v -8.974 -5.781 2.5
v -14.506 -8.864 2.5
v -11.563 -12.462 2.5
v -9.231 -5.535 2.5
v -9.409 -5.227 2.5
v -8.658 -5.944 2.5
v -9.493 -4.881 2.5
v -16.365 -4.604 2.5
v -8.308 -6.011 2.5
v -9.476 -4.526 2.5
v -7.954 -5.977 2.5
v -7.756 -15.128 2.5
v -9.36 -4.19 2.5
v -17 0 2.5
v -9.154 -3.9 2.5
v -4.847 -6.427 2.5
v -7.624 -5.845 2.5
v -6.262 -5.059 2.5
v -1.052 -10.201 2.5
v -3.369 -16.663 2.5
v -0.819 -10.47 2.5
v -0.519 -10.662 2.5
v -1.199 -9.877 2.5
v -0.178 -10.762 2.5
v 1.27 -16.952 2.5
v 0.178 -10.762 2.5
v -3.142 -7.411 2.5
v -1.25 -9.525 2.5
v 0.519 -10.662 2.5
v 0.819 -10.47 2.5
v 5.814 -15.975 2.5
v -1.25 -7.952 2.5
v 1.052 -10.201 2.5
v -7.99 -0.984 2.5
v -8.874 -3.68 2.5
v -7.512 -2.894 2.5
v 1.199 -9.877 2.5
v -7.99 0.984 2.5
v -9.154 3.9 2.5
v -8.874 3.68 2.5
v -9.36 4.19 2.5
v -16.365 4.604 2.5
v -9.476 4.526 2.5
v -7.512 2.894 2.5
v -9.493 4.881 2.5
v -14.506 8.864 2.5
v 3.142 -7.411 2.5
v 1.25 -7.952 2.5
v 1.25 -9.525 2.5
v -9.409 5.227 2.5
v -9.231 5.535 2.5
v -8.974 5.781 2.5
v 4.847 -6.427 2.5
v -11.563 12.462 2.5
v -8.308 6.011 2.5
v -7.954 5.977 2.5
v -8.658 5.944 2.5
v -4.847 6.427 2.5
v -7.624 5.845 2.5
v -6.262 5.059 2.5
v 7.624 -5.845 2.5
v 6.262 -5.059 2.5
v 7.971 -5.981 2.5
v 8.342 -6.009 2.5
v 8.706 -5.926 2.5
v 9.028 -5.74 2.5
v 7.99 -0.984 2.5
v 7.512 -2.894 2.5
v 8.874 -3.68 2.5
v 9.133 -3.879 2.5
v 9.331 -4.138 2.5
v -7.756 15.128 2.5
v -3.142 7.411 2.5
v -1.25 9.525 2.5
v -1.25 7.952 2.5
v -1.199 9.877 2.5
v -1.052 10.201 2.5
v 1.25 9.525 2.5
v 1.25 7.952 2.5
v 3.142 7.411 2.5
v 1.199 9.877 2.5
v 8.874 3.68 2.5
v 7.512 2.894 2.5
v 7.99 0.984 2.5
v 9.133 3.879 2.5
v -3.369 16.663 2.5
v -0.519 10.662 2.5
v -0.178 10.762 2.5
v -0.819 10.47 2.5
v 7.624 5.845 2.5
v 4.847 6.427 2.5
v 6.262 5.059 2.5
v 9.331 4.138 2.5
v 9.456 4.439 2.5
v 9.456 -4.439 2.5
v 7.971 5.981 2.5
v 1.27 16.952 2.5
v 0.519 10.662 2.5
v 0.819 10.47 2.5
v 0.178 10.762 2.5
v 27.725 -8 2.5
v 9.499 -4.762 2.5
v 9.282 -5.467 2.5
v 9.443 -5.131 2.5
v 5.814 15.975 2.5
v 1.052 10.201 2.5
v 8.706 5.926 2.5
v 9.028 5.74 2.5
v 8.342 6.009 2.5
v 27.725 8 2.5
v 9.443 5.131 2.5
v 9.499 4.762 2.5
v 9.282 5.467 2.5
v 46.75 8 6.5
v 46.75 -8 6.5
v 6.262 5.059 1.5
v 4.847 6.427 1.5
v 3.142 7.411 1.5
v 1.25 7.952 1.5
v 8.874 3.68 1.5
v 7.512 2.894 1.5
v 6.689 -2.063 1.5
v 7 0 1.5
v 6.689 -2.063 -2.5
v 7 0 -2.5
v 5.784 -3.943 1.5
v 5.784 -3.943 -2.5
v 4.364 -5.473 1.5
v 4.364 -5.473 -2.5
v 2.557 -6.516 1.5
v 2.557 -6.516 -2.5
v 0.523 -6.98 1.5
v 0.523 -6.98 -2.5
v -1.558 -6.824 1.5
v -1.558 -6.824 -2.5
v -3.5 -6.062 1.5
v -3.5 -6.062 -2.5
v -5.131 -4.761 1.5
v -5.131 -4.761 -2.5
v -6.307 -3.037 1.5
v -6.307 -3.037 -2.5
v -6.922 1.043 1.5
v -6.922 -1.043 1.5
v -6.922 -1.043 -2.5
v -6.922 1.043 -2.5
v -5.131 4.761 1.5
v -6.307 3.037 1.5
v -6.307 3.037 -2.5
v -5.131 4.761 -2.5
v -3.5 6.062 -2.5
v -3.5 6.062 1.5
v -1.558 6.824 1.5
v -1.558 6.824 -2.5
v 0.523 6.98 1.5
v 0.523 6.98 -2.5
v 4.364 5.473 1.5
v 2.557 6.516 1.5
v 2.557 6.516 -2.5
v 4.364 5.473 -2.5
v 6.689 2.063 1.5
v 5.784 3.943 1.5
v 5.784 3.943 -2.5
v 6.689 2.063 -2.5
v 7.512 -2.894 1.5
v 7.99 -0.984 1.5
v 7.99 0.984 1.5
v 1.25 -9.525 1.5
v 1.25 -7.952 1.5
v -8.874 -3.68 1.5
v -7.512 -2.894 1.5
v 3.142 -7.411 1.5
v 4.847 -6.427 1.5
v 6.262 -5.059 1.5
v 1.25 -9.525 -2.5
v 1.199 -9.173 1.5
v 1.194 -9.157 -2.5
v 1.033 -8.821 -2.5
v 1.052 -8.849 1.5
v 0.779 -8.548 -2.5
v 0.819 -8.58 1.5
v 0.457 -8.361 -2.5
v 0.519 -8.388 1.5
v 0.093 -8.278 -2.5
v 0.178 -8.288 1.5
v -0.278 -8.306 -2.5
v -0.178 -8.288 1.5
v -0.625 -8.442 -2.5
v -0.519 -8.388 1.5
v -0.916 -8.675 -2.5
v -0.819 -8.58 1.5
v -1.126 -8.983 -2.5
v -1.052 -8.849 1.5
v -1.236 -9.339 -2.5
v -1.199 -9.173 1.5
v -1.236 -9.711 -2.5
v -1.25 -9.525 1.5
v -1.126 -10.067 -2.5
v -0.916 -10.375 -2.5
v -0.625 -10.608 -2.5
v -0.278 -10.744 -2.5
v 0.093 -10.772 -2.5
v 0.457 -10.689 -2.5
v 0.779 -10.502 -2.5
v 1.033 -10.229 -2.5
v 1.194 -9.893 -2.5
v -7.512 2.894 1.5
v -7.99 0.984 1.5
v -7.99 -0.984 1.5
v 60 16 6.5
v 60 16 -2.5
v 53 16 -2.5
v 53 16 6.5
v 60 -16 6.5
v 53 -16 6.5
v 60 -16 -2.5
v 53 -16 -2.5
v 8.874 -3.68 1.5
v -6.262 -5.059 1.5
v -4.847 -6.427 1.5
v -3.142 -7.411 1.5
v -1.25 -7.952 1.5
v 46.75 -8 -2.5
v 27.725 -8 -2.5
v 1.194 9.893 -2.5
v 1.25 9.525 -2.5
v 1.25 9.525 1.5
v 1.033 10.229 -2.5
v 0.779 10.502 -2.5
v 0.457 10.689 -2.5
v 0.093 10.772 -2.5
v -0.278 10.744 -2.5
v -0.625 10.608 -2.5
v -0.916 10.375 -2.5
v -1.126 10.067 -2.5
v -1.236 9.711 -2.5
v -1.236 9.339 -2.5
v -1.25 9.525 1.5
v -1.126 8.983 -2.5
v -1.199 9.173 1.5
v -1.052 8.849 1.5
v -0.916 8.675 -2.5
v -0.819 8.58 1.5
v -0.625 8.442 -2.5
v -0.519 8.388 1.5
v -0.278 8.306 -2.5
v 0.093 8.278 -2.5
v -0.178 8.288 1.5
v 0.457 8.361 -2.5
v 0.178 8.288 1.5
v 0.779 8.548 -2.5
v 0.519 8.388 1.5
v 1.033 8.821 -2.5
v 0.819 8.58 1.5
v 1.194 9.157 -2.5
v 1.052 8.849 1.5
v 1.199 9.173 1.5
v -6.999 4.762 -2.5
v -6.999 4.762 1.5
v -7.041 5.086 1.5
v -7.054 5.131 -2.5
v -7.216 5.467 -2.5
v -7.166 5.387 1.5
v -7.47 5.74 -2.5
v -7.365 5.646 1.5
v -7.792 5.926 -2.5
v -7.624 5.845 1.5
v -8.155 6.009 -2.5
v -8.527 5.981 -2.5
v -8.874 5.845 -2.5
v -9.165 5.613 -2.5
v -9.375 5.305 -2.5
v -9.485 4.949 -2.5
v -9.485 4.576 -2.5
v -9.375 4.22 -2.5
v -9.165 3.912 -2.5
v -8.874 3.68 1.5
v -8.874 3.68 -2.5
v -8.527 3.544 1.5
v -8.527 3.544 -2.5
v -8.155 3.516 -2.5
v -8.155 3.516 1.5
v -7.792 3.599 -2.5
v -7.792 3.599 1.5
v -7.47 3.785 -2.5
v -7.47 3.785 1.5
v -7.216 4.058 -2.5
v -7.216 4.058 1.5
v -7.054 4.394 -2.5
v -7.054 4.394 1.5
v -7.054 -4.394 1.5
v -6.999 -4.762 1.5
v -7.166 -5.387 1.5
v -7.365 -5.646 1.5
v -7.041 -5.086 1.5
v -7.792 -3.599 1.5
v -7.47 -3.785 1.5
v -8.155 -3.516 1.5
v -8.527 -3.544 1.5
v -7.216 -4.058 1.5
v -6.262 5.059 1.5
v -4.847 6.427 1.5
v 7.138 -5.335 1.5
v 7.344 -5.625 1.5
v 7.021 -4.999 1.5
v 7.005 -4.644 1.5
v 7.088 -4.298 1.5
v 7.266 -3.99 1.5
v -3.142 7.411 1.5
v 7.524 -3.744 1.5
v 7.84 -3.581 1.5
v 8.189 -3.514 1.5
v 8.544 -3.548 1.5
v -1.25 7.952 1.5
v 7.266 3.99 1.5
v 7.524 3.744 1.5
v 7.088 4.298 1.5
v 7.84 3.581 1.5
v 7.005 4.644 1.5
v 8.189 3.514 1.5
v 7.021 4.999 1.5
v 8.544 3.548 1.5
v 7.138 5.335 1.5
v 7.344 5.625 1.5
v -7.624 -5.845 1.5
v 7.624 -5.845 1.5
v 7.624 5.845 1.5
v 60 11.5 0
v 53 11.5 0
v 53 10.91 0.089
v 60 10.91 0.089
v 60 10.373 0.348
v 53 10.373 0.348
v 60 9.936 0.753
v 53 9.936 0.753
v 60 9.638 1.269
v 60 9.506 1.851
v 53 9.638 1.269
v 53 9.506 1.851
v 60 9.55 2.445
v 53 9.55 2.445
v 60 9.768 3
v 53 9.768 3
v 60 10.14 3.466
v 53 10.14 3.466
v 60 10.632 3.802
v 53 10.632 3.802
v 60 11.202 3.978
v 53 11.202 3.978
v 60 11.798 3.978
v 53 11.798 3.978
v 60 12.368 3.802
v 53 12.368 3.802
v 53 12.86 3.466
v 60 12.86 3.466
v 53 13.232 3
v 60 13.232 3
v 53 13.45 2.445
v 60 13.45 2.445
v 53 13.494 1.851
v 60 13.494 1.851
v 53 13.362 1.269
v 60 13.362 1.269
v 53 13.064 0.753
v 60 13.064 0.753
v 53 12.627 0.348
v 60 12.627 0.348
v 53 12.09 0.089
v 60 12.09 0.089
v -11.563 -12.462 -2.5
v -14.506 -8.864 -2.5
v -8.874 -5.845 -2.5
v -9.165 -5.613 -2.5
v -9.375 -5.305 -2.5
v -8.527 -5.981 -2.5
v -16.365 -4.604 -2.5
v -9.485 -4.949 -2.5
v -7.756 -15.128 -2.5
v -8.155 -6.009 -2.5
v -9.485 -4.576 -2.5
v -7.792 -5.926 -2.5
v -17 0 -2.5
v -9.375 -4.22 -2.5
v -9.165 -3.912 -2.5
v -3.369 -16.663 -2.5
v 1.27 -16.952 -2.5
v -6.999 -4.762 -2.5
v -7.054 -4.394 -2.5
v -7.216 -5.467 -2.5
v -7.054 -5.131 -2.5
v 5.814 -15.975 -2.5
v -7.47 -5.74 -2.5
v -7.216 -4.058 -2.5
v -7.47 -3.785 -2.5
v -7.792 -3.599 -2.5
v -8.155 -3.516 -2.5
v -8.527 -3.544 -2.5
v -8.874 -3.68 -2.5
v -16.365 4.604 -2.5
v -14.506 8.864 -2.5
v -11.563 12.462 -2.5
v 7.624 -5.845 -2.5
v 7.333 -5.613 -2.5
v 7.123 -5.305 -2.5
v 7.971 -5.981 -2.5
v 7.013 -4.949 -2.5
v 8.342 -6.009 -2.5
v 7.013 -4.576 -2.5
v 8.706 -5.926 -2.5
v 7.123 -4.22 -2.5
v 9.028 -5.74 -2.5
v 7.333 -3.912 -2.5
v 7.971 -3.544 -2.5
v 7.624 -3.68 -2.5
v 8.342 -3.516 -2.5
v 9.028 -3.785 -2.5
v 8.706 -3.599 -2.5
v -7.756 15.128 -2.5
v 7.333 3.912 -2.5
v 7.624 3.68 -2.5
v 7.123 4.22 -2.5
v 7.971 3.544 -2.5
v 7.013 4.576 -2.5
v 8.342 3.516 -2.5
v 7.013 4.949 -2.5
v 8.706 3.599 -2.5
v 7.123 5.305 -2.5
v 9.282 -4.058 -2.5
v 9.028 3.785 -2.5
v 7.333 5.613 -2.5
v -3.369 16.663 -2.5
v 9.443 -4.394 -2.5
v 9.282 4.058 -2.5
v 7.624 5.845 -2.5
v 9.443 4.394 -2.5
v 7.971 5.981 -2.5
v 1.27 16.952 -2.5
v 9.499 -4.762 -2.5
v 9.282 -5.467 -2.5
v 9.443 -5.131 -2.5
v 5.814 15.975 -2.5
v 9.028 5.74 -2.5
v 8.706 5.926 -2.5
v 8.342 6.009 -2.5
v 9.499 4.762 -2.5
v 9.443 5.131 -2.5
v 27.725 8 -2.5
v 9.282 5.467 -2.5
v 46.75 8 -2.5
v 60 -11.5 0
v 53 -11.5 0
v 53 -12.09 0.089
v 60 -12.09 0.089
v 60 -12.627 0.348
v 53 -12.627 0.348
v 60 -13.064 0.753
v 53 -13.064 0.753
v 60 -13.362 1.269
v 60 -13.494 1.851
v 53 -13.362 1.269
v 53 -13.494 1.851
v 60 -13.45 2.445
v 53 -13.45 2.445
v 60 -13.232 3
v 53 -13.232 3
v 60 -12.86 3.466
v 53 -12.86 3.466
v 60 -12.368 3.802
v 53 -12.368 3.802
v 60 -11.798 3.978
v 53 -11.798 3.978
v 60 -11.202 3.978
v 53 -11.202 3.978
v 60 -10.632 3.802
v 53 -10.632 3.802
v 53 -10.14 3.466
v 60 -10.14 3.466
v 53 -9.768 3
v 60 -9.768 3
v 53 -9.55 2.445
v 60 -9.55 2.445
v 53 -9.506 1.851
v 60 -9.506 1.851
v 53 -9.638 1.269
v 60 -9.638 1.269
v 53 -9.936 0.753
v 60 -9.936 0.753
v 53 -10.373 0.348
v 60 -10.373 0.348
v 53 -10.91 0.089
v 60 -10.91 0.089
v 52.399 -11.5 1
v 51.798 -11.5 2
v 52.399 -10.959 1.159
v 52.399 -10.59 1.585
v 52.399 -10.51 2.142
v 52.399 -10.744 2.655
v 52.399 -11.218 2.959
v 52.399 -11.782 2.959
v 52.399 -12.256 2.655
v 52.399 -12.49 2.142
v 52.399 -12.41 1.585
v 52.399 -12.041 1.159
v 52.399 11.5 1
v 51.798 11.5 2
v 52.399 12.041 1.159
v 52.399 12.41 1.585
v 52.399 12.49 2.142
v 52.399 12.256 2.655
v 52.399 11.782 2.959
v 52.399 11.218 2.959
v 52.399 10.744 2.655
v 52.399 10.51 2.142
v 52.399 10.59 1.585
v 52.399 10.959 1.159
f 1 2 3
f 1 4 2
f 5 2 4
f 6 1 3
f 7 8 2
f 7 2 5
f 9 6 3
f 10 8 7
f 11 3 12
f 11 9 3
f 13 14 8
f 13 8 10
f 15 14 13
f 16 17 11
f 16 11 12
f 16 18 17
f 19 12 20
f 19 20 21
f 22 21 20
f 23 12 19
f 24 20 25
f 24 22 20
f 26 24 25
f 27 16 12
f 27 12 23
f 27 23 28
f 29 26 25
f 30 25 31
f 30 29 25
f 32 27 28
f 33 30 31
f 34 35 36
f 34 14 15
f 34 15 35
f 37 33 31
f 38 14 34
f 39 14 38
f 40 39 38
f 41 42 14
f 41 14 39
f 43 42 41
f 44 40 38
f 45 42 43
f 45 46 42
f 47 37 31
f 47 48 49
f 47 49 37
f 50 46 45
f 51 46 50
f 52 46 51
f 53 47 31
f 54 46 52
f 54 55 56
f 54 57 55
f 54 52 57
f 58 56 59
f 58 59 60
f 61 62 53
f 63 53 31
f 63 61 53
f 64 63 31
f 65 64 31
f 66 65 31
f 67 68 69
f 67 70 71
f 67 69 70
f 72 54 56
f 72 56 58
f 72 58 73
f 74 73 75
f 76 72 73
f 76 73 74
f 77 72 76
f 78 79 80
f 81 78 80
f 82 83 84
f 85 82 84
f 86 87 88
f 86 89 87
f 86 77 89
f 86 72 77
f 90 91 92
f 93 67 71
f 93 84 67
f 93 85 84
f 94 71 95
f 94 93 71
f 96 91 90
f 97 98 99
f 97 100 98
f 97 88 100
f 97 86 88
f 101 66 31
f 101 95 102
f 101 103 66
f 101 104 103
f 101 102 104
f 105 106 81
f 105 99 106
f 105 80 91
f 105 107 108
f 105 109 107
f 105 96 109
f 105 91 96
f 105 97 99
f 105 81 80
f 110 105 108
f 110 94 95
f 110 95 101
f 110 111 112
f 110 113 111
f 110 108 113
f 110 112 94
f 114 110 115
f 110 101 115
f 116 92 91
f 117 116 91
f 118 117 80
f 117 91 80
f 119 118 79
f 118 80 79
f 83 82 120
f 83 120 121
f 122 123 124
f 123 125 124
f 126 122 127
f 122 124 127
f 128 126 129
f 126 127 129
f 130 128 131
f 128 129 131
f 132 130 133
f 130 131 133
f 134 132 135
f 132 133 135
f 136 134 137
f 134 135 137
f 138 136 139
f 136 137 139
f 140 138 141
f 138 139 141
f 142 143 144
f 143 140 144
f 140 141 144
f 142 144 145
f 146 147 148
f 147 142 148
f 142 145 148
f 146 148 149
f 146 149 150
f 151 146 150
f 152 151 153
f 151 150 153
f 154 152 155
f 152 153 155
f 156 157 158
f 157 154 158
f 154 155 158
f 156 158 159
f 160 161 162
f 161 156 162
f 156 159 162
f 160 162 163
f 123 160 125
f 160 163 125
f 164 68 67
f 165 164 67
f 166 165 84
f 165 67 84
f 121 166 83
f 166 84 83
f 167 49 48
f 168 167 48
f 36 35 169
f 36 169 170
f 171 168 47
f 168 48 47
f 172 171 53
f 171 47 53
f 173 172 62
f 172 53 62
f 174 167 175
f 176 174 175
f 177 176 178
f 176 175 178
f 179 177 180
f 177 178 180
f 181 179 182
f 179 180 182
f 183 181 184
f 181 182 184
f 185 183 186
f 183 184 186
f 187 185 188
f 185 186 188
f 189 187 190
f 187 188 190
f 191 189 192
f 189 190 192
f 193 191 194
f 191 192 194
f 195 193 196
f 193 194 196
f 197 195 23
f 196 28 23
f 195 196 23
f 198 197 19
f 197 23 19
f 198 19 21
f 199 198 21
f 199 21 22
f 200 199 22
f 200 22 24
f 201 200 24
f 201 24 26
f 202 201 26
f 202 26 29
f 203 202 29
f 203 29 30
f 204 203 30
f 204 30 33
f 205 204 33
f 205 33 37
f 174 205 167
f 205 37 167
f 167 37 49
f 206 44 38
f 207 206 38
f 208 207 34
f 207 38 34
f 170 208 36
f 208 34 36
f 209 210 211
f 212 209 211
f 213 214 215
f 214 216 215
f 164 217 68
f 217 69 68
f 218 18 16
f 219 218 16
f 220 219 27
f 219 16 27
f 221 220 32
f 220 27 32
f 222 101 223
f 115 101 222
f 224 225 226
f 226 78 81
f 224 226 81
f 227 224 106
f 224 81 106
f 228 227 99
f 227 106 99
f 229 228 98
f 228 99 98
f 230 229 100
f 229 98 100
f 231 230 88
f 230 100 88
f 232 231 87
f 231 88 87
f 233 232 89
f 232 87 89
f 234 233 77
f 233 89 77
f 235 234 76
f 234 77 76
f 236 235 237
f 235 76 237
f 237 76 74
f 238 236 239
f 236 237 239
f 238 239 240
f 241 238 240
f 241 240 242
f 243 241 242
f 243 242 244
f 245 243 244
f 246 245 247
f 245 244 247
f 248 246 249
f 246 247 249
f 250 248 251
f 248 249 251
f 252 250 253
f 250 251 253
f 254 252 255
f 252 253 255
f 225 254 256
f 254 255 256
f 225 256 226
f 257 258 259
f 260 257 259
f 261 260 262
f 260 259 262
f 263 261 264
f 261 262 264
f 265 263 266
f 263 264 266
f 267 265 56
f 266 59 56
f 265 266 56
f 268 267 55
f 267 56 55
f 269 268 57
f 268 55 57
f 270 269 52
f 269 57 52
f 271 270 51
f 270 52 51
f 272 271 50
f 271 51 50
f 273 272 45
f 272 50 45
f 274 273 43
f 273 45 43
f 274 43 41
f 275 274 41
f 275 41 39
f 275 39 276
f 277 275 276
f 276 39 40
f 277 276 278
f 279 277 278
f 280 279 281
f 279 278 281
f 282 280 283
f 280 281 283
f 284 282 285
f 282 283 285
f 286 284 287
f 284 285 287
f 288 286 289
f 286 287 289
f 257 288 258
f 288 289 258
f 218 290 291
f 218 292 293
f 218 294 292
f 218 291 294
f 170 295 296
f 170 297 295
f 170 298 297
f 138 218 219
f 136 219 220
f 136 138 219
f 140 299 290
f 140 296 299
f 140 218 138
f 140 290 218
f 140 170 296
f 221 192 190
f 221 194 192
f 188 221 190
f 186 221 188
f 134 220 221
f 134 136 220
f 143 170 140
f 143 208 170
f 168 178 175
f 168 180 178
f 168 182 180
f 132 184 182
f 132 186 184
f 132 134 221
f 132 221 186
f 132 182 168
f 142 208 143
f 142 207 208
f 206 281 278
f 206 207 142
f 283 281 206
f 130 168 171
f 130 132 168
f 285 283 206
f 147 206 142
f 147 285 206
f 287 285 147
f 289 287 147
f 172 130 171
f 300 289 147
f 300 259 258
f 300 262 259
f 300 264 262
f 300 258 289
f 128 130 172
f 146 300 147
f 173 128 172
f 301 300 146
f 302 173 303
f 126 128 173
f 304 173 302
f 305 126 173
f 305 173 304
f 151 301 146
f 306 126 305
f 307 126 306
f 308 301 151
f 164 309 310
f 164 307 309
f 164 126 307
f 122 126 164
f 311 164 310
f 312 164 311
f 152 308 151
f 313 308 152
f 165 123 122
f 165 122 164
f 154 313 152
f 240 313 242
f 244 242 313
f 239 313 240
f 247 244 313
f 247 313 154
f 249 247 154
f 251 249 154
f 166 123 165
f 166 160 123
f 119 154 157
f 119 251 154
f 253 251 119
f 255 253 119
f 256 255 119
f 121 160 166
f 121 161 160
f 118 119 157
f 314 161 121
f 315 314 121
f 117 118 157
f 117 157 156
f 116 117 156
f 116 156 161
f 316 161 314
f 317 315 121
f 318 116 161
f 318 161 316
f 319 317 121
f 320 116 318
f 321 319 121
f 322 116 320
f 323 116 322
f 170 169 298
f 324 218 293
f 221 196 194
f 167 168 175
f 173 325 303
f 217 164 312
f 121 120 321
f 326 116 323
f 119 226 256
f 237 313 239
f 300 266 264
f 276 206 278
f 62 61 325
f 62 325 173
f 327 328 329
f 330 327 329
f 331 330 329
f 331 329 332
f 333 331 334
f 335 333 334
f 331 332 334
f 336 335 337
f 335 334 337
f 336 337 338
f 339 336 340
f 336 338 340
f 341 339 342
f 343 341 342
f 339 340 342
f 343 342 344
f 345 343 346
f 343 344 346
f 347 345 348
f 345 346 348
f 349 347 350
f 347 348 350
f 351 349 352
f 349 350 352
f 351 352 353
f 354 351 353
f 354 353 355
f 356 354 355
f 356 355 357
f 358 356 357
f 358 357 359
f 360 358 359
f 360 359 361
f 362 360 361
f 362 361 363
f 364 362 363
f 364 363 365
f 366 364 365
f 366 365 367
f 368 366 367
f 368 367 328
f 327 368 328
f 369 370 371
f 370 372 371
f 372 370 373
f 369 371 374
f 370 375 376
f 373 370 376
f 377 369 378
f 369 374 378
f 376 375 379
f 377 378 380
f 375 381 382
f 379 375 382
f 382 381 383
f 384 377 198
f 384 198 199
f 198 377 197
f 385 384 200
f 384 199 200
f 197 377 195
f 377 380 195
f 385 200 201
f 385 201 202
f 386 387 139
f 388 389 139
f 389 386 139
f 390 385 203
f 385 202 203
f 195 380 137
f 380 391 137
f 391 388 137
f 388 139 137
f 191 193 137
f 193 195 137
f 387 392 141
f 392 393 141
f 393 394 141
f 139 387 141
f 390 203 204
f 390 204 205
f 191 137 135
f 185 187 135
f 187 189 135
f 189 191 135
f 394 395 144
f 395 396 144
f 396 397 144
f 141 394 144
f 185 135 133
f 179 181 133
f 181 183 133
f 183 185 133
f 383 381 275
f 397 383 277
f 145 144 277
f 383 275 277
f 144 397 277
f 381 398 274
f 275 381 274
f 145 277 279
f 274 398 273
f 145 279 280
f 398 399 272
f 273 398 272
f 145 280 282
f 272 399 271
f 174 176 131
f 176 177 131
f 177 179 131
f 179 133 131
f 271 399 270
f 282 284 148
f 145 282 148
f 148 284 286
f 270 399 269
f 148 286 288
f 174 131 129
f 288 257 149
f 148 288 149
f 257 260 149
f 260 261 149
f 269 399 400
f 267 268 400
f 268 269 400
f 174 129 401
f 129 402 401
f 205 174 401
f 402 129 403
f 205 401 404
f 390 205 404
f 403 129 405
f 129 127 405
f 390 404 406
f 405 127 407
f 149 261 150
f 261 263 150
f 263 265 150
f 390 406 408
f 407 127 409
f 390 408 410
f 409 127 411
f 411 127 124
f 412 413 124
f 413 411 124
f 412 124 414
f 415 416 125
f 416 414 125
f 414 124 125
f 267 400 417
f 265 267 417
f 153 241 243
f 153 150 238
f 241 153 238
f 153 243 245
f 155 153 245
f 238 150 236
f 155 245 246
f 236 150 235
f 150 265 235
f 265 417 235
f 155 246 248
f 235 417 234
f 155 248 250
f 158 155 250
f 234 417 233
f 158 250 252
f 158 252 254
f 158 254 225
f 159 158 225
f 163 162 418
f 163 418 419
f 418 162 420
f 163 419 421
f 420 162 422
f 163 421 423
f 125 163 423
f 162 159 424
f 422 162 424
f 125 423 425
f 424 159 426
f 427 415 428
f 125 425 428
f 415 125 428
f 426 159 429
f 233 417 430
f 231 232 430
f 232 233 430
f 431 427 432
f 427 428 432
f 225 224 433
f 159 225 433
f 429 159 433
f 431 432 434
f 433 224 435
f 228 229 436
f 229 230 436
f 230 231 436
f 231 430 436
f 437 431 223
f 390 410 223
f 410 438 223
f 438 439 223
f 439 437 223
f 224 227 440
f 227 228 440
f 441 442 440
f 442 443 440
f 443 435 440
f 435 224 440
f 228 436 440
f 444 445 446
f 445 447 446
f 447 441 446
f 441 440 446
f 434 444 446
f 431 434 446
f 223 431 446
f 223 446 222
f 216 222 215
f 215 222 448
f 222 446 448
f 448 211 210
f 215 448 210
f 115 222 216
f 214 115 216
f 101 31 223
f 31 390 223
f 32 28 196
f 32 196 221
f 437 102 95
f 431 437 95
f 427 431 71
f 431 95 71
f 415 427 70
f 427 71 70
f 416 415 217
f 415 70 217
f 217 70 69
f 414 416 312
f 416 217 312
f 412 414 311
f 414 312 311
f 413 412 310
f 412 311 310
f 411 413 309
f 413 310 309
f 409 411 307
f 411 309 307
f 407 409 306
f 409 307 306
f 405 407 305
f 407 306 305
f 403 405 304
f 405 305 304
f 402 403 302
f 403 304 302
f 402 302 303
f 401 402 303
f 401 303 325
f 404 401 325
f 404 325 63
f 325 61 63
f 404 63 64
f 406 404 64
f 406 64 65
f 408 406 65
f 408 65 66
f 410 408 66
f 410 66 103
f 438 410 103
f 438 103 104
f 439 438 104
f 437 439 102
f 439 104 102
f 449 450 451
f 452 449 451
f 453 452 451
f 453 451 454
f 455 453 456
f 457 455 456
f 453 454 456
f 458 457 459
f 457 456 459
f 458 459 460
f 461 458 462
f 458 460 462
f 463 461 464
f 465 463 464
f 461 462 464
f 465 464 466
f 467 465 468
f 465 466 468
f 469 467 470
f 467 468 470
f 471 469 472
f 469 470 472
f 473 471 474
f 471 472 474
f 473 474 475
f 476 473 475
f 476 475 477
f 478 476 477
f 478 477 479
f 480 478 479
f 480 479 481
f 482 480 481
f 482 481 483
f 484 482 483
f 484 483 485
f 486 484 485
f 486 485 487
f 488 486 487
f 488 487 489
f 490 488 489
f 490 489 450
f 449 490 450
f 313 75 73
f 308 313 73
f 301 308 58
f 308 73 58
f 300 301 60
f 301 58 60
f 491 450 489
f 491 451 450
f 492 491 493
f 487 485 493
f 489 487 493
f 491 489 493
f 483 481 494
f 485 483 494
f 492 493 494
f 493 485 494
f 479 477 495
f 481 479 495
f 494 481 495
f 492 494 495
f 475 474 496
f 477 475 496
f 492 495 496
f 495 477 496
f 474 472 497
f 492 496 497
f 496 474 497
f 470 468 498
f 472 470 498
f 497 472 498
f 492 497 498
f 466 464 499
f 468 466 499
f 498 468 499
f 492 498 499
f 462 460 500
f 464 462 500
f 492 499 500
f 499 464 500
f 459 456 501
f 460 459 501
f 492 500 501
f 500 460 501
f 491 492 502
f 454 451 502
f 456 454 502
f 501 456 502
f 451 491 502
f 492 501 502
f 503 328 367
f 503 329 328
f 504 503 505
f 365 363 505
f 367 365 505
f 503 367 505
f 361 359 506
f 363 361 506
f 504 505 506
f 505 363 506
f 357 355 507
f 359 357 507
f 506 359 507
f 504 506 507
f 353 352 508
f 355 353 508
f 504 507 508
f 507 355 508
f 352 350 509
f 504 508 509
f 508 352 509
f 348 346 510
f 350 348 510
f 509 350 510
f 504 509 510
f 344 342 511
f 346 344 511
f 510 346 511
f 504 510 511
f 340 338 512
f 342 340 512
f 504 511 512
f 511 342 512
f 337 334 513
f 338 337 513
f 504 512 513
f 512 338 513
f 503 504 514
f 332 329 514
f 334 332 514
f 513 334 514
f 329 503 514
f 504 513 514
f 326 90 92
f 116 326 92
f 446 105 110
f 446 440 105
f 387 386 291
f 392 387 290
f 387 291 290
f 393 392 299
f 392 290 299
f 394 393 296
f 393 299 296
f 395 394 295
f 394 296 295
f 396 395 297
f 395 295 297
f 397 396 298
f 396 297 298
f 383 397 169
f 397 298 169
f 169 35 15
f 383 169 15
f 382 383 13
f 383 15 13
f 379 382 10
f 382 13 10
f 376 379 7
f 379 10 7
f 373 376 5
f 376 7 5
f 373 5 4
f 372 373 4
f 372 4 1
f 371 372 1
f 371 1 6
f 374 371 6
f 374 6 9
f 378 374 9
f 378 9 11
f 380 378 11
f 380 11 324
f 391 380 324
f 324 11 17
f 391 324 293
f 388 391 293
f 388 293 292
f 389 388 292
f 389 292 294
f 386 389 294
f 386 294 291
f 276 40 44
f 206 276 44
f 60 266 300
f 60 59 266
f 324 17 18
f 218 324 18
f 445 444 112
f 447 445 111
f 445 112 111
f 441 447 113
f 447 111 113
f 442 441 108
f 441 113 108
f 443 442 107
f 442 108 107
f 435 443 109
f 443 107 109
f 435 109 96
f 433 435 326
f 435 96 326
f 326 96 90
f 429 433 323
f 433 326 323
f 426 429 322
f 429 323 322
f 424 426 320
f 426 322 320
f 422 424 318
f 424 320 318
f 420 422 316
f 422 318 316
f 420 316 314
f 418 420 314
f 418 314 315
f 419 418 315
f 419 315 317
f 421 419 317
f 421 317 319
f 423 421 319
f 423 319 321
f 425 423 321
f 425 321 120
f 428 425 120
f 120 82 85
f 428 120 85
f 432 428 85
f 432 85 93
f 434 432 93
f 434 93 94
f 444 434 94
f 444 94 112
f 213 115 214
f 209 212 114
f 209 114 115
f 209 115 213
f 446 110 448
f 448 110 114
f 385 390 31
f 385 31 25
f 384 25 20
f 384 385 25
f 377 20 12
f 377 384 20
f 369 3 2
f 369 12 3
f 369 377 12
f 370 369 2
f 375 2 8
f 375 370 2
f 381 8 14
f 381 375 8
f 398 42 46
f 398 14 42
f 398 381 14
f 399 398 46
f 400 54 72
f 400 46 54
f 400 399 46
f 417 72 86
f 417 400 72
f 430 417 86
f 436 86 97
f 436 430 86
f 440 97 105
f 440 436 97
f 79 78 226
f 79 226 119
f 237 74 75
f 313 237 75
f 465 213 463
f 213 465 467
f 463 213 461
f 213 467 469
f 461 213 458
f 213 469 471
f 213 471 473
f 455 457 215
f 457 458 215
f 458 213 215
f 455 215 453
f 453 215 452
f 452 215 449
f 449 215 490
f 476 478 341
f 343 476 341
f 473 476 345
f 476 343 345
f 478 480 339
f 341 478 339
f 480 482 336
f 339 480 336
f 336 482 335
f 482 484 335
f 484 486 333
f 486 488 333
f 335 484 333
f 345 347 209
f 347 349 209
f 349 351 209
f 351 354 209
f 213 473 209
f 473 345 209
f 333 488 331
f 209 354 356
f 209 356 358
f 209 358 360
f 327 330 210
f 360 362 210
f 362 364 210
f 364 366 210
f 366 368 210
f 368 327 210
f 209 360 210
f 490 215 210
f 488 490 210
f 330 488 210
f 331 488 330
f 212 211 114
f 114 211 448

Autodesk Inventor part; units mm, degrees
ref_plane "YZ Plane" through (0, 0, 0) normal (1, 0, 0) x (0, 1, 0)
ref_plane "XZ Plane" through (0, 0, 0) normal (0, 1, 0) x (-1, 0, 0)
ref_plane "XY Plane" through (0, 0, 0) normal (0, 0, 1) x (1, 0, 0)
sketch "Base" plane through (0, 0, 0) normal (0, 0, 1) x (1, 0, 0)
  circle A0 centre (0, 0) radius 7
  circle A1 centre (0, 0) radius 17
  line L0 (-32.4, 0) -> (75.4, 0) construction
  line L1 (5.8143, 15.9748) -> (27.7249, 8)
  line L2 (27.7249, 8) -> (46.7497, 8)
  line L3 (46.7497, 8) -> (53, 16)
  line L4 (53, 16) -> (60, 16)
  line L5 (60, 16) -> (60, 0)
  line L6 (5.8143, -15.9748) -> (27.7249, -8)
  line L7 (27.7249, -8) -> (46.7497, -8)
  line L8 (46.7497, -8) -> (53, -16)
  line L9 (53, -16) -> (60, -16)
  line L10 (60, -16) -> (60, 0)
  point P0 (5.8143, -15.9748)
  dimension "d1" = 34
  dimension "d0" = 14
  dimension "d2" = 16
  dimension "d3" = 128
  dimension "d4" = 7
  dimension "d6" = 160
  dimension "d7" = 60
  dimension "d8" = 16
extrude "BaseFeature" add sketch "Base" along normal mid plane 5
sketch "Mount" plane through (0, 0, 2.5) normal (0, 0, 1) x (1, 0, 0)
  line L0 (60, 16) -> (53, 16) projected
  line L1 (60, -16) -> (60, 16) projected
  line L2 (53, -16) -> (60, -16) projected
  line L3 (46.7497, -8) -> (53, -16) projected
  line L4 (53, 16) -> (46.7497, 8) projected
  line L5 (46.7497, 8) -> (46.7497, -8)
  point P0 (0, 0)
extrude "MountFeature" add sketch "Mount" along normal blind 4
sketch "MountTransition" plane through (27.7249, -8, -2.5) normal (0, -1, 0) x (1, 0, 0)
  line L0 (0, 5) -> (19.0249, 5) projected
  line L1 (0, 5) -> (19.0249, 9)
  line L2 (19.0249, 5) -> (19.0249, 9) projected
  point P0 (-27.7249, 2.5)
extrude "MountTransitionFeature" add sketch "MountTransition" against normal up to surface (16 mm away)
sketch "HubMount" plane through (0, 0, 2.5) normal (0, 0, 1) x (1, 0, 0)
  circle A0 centre (0, -9.525) radius 1.25 projected
  circle A1 centre (8.2489, -4.7625) radius 1.25 projected
  circle A2 centre (8.2489, 4.7625) radius 1.25 projected
  circle A3 centre (0, 9.525) radius 1.25 projected
  circle A4 centre (-8.2489, 4.7625) radius 1.25 projected
  circle A5 centre (-8.2489, -4.7625) radius 1.25 projected
  point P0 (0, 0)
extrude "HubMountFeature" cut sketch "HubMount" against normal through all
sketch "BearingIndentation" plane through (0, 0, 2.5) normal (0, 0, 1) x (1, 0, 0)
  circle A0 centre (0, 0) radius 7 projected
  circle A1 centre (0, 0) radius 8.05
  circle A2 centre (0, 9.525) radius 1.25 projected
  circle A3 centre (8.2489, 4.7625) radius 1.25 projected
  circle A4 centre (-8.2489, 4.7625) radius 1.25 projected
  circle A5 centre (-8.2489, -4.7625) radius 1.25 projected
  circle A6 centre (0, -9.525) radius 1.25 projected
  circle A7 centre (8.2489, -4.7625) radius 1.25 projected
  line L0 (-8.2489, 4.7625) -> (0, 0) construction
  line L1 (0, 9.525) -> (0, 0) construction
  line L2 (-7.6239, 5.845) -> (-6.2619, 5.0587)
  line L3 (-8.8739, 3.68) -> (-7.5119, 2.8936)
  line L4 (-1.25, 9.525) -> (-1.25, 7.9524)
  line L5 (1.25, 9.525) -> (1.25, 7.9524)
  line L6 (7.6239, 5.845) -> (6.2619, 5.0587)
  line L7 (8.8739, 3.68) -> (7.5119, 2.8936)
  line L8 (-32.4, 0) -> (75.4, 0) construction
  line L9 (-7.6239, -5.845) -> (-6.2619, -5.0587)
  line L10 (-8.8739, -3.68) -> (-7.5119, -2.8936)
  line L11 (-1.25, -9.525) -> (-1.25, -7.9524)
  line L12 (1.25, -9.525) -> (1.25, -7.9524)
  line L13 (7.6239, -5.845) -> (6.2619, -5.0587)
  line L14 (8.8739, -3.68) -> (7.5119, -2.8936)
  point P0 (1.25, -9.525)
  dimension "d47" = 16.1
extrude "BearingIndentationFeature" cut sketch "BearingIndentation" against normal blind 1 contours A1 | A1 L6 A3 L7 | L14 A7 L13 A1 | A1 L4 A2 L5 | L12 A6 L11 A1 | A1 L3 A4 L2 | L9 A5 L10 A1
sketch "Sketch16" plane through (60, -16, -2.5) normal (1, 0, 0) x (0, 0, -1)
  line L0 (0, 32) -> (-9, 32) construction
  line L1 (-9, 0) -> (-9, 32) construction
  line L2 (0, 0) -> (-9, 0) construction
  line L3 (0, 32) -> (0, 0) construction
  line L4 (-4.5, 32) -> (-4.5, 0) construction
  circle A0 centre (-4.5, 27.5) radius 2.5
  line L5 (-9, 0) -> (-9, 32) projected
  line L6 (-9, 16) -> (0, 16) construction
  circle A1 centre (-4.5, 4.5) radius 2.5
  point P0 (-2.5, 16)
  dimension "d65" = 5
  dimension "d66" = 4.5
  dimension "d67" = 4.5
hole "Hole2" at (60, 11.5, 2) at (60, -11.5, 2) direction (-1, 0, 0) diameter 4 depth 7 tip angle 118
equation "\"d67\" = d66"
properties part number "NeckMount"
